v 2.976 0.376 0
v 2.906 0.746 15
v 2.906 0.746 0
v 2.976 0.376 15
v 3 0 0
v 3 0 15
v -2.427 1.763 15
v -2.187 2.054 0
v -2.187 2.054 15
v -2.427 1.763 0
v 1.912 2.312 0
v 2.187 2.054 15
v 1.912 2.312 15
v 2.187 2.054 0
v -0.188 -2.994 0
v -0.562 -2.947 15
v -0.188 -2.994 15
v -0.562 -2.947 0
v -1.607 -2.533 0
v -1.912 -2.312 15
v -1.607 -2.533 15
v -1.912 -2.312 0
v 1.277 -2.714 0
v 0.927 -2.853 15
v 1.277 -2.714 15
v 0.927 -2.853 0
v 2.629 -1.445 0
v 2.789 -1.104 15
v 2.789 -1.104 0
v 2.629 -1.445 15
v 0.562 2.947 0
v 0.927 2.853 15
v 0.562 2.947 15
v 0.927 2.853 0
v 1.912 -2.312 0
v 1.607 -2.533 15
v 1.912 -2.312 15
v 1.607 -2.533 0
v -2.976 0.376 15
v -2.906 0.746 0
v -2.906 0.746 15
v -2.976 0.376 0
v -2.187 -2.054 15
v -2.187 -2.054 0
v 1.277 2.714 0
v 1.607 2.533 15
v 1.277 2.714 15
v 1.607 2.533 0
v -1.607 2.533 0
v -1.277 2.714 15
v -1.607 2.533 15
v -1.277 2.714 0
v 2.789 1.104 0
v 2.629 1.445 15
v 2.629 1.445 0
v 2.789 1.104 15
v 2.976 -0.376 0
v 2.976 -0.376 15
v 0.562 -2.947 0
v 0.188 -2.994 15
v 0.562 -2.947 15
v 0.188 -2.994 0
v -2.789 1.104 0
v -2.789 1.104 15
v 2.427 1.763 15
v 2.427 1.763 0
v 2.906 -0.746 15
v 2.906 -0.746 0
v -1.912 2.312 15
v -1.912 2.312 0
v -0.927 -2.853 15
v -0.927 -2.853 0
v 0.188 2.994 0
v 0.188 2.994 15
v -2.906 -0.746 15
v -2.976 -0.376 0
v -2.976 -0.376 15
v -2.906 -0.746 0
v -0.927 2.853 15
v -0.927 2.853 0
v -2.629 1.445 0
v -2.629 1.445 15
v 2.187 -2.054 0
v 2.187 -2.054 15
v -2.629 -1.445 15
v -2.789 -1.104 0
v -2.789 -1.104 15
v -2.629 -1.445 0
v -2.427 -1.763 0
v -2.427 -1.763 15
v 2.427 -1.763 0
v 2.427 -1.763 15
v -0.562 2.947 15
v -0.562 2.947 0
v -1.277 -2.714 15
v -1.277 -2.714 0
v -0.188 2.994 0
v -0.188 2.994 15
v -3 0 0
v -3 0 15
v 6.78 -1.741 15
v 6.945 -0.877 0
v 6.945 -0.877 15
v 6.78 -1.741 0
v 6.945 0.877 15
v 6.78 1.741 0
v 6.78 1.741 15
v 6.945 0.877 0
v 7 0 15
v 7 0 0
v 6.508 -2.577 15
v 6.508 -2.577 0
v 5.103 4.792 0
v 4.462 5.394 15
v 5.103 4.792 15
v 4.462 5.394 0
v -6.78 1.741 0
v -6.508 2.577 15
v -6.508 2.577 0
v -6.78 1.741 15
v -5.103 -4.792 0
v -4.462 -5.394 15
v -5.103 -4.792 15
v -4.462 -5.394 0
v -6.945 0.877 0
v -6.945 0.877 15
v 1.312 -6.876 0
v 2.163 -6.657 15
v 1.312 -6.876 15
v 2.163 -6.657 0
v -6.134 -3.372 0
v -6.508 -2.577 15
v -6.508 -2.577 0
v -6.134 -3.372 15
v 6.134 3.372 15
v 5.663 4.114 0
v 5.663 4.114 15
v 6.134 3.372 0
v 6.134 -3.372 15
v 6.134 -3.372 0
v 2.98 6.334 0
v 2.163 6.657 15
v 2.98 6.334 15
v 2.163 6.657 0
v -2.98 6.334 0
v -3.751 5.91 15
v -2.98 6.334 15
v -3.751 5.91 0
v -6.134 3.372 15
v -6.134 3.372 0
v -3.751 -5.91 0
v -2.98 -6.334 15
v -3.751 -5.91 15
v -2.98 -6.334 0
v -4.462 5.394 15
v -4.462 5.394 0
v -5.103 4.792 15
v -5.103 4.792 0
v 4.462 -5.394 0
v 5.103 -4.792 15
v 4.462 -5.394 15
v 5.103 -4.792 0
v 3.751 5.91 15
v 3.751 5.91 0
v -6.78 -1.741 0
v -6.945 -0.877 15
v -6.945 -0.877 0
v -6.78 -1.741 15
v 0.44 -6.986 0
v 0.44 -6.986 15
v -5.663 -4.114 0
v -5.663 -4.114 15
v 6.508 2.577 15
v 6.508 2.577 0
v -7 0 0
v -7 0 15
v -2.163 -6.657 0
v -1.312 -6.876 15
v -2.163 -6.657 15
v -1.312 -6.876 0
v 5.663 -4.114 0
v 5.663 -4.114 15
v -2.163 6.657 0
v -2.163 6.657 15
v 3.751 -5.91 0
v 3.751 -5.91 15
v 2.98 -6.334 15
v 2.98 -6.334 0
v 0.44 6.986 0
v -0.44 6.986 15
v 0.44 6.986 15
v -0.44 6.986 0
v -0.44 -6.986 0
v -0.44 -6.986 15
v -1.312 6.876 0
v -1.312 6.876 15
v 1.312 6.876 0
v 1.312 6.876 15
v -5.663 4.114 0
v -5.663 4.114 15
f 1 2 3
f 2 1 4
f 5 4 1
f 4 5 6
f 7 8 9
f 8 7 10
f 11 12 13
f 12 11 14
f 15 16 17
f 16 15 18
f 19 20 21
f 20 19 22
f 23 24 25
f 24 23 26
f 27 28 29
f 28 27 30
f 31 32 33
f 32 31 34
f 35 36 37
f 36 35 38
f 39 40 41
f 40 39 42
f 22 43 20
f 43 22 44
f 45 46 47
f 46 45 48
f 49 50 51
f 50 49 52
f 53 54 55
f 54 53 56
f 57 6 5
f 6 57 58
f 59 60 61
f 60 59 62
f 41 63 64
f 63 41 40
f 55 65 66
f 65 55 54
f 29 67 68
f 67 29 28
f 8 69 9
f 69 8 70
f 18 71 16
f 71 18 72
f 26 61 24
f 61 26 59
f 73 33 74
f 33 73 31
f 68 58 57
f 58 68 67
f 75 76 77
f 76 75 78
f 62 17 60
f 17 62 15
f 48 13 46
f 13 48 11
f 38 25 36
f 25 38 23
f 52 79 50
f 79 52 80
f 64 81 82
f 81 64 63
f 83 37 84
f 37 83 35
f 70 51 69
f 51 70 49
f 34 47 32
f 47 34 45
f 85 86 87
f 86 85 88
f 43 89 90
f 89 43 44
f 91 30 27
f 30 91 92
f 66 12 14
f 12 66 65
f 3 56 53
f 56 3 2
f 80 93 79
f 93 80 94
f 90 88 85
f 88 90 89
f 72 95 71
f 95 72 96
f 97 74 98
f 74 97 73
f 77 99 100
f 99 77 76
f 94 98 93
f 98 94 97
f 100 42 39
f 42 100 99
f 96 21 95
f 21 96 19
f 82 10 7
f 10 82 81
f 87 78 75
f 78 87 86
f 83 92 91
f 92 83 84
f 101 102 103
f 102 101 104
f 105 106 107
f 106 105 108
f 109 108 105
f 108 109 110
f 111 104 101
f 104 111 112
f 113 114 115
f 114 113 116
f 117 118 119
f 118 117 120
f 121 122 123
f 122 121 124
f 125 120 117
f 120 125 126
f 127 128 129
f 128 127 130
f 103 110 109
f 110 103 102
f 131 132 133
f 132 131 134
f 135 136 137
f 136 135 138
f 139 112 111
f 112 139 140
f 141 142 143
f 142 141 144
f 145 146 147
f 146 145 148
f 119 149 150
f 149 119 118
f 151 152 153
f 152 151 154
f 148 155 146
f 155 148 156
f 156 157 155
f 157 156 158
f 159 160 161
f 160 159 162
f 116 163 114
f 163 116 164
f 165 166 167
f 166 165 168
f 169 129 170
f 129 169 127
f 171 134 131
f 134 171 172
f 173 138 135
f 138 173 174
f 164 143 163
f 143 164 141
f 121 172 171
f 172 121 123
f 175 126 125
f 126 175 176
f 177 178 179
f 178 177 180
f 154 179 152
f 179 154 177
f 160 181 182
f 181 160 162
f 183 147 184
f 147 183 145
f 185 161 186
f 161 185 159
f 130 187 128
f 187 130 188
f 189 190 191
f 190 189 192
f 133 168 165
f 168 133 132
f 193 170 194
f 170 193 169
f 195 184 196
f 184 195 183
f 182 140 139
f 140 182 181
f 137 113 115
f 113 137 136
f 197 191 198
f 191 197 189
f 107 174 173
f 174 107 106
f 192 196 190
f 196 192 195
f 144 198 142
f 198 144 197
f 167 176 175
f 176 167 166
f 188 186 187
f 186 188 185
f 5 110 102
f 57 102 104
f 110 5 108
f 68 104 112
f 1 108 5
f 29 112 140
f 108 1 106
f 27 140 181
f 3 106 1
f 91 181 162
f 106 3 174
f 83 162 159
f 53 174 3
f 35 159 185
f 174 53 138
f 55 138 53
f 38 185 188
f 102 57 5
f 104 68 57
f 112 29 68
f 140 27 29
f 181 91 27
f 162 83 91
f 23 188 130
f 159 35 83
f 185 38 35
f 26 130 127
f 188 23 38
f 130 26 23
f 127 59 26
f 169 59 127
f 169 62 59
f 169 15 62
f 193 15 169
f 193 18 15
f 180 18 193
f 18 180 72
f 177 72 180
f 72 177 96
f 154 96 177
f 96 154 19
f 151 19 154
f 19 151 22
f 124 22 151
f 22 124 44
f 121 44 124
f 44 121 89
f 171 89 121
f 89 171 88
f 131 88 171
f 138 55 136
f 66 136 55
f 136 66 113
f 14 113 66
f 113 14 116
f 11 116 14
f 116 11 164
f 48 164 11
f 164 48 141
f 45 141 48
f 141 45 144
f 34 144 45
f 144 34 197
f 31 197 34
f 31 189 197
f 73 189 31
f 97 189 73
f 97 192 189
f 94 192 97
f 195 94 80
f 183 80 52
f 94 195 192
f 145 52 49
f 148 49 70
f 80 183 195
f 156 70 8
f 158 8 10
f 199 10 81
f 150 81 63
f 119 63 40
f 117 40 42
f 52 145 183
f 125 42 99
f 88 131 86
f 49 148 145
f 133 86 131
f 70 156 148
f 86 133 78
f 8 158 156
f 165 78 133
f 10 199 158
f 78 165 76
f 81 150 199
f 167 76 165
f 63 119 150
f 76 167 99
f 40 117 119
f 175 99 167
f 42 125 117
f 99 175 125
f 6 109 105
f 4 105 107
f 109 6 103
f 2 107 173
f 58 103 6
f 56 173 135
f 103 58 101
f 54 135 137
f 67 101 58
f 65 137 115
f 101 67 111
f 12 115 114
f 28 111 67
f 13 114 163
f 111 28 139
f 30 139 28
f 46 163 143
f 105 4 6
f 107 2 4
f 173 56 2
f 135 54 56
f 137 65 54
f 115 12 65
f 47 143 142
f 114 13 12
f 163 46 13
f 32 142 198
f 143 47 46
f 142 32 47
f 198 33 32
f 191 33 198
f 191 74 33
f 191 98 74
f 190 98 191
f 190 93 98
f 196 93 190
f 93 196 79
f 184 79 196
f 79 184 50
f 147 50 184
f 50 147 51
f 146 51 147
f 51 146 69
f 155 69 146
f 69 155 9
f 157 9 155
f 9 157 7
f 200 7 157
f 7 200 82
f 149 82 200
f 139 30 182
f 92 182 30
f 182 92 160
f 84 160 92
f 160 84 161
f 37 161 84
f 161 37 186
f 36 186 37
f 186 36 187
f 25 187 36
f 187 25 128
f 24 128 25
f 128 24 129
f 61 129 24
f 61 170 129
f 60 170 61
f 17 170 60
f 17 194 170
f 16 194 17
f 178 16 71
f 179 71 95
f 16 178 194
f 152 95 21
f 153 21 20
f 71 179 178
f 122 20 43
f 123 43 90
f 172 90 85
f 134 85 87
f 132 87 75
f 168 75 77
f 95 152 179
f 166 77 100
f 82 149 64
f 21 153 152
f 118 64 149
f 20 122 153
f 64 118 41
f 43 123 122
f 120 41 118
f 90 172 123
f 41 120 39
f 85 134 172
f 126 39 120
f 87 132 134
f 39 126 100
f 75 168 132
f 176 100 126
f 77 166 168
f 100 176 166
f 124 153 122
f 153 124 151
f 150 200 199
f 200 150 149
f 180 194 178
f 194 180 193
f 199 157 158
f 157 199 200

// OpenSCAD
$fn = 50;


difference() {
	union() {
		*color(alpha = 1.0000000000, c = "gray") {
			translate(v = [0, 7, 0]) {
				linear_extrude(height = 1) {
					text(font = "Arial:style=Bold", halign = "center", size = 4.5000000000, text = "COMMENT plate main", valign = "center");
				}
			}
		}
		*color(alpha = 1.0000000000, c = "gray") {
			translate(v = [0, 14, 0]) {
				linear_extrude(height = 1) {
					text(font = "Arial:style=Bold", halign = "center", size = 4.5000000000, text = "COMMENT description oobb_plate_shape_p_type_15_depth_1_width_1_height_15_thickness_true_both_holes", valign = "center");
				}
			}
		}
		cylinder(h = 15, r = 7.0000000000);
	}
	union() {
		*color(alpha = 1.0000000000, c = "gray") {
			translate(v = [0, 7, 0]) {
				linear_extrude(height = 1) {
					text(font = "Arial:style=Bold", halign = "center", size = 4.5000000000, text = "COMMENT holes main", valign = "center");
				}
			}
		}
		*color(alpha = 1.0000000000, c = "gray") {
			translate(v = [0, 14, 0]) {
				linear_extrude(height = 1) {
					text(font = "Arial:style=Bold", halign = "center", size = 4.5000000000, text = "COMMENT description oobb_holes_shape_n_type_1_width_1_height_15_thickness_true_both_holes", valign = "center");
				}
			}
		}
		translate(v = [0, 0, -50]) {
			cylinder(h = 100, r = 3.0000000000);
		}
		translate(v = [0, 0, -50]) {
			cylinder(h = 100, r = 1.5000000000);
		}
	}
}
